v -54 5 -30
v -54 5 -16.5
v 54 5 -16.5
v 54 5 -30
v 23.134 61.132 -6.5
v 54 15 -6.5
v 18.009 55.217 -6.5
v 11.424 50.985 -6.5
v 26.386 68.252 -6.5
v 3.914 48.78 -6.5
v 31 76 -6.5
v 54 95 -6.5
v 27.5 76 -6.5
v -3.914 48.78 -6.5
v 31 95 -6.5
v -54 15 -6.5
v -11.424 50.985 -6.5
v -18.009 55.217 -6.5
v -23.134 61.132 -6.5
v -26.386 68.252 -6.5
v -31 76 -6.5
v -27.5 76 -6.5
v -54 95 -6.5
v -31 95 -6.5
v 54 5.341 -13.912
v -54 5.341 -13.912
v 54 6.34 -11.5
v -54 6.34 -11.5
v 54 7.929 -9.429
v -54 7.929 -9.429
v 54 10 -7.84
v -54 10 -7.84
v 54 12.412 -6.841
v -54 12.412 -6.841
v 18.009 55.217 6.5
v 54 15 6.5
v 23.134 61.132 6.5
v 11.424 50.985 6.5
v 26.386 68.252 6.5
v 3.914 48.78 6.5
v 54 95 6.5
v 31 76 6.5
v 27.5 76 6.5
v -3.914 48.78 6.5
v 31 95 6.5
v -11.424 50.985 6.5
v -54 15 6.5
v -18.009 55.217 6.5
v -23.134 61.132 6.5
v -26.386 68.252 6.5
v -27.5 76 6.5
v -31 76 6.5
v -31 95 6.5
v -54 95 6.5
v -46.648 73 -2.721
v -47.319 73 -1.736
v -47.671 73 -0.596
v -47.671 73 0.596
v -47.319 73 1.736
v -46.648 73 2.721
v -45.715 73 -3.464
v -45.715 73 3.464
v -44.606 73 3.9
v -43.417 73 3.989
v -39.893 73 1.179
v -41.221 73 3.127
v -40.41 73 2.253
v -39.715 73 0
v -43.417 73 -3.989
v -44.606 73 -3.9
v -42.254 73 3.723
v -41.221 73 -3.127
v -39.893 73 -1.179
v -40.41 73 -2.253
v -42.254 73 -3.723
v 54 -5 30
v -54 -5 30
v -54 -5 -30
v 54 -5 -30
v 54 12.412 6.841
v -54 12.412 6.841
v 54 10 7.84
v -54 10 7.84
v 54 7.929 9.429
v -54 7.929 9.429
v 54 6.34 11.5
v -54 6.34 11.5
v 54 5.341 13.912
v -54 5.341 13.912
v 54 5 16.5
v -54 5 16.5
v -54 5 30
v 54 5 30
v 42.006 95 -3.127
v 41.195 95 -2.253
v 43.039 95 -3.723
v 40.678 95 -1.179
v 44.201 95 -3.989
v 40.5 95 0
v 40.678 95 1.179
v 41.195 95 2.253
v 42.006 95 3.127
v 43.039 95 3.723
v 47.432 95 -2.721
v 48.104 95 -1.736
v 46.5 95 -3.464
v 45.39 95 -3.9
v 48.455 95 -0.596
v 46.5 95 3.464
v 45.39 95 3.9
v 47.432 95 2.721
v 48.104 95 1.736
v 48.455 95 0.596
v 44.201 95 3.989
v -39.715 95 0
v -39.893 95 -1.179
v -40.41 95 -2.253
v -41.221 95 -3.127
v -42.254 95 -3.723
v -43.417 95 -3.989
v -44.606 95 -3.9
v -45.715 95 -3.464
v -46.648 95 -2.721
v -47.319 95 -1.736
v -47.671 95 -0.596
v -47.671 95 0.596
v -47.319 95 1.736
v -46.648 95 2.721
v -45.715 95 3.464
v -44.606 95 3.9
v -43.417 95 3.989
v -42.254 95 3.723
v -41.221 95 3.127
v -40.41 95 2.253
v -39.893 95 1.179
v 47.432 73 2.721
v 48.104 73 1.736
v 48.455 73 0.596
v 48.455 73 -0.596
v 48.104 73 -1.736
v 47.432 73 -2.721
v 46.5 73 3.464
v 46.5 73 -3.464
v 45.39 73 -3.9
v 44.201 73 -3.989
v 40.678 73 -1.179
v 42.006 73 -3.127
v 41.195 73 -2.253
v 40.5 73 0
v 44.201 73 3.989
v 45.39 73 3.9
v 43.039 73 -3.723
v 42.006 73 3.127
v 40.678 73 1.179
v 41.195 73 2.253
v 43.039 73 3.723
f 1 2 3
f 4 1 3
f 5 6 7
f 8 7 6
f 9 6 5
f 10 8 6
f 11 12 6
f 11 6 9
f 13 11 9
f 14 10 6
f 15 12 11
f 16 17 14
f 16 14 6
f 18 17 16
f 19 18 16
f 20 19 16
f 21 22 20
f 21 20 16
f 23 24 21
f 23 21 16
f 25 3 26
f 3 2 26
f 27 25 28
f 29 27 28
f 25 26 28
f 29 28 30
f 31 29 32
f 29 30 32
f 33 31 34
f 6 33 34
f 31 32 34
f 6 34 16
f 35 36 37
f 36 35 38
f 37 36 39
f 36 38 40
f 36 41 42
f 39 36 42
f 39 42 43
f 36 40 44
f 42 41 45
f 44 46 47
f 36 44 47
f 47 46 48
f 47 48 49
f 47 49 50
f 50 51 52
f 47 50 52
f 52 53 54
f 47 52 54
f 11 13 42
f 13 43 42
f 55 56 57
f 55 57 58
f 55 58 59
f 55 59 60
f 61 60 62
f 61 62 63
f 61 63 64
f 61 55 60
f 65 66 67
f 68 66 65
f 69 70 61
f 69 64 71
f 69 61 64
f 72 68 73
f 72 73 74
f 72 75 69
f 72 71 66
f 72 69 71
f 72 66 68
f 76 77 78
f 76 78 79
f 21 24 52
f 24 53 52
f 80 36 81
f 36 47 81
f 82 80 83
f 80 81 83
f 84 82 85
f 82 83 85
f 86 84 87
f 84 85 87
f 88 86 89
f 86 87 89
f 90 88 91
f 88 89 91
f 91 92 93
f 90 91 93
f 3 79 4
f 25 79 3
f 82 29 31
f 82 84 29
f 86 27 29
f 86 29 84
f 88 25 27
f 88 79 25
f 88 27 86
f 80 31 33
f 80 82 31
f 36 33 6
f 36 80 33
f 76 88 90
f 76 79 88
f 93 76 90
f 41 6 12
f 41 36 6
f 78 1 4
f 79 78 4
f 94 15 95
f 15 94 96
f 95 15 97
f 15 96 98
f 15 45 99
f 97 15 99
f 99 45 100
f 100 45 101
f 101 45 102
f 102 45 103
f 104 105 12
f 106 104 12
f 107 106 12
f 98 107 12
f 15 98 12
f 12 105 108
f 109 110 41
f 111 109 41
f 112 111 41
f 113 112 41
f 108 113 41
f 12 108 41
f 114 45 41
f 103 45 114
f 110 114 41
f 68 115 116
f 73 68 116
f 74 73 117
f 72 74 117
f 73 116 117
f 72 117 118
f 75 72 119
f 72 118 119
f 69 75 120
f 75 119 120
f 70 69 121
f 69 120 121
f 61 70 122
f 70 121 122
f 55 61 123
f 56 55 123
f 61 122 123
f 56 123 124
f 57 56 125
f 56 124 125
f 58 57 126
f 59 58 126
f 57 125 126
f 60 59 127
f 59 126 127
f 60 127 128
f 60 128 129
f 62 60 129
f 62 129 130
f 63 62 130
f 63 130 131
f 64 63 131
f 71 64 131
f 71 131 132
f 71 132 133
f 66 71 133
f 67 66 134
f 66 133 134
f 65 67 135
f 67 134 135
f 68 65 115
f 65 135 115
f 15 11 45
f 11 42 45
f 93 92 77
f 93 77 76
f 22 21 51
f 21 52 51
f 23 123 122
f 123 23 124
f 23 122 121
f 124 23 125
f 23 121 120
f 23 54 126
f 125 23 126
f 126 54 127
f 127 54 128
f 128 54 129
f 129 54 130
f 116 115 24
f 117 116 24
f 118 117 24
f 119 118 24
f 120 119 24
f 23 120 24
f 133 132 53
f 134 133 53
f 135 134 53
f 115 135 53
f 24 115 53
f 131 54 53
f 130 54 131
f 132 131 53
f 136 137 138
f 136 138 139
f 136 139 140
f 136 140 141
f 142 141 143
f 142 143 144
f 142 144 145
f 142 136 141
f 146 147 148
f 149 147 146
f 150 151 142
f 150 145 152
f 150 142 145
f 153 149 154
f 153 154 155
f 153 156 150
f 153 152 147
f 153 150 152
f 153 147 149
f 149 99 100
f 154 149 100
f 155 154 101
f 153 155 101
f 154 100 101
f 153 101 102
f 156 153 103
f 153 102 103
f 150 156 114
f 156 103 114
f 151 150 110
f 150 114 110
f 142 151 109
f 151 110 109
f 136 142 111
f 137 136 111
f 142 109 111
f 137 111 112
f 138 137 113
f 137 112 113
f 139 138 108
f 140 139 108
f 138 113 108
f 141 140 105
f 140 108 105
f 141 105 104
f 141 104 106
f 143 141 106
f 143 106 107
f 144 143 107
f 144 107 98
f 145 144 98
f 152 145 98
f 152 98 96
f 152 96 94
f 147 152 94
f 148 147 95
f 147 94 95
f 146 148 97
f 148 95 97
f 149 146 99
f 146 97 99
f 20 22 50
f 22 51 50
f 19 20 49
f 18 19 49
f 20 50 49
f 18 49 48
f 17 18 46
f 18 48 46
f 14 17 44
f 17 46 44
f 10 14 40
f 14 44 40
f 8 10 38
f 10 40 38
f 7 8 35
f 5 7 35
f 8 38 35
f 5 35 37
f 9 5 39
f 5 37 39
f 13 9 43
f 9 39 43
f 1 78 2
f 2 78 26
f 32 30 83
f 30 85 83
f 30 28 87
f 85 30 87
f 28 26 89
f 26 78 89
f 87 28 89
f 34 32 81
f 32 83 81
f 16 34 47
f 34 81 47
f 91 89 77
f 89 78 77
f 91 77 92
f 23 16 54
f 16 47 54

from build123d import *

# Parameters (mm, degrees)
SKETCH1_W           = 108
SKETCH1_H           = 10
BOSS_EXTRUDE1_DEPTH = 30
BOSS_EXTRUDE2_DEPTH = 6.5
SKETCH3_R           = 4
CUT_EXTRUDE1_DEPTH  = 22
FILLET1_R           = 10


with BuildPart() as part:
    # Sketch1 → Boss-Extrude1 (new, symmetric)
    with BuildSketch(Plane.XY):
        Rectangle(SKETCH1_W, SKETCH1_H)
    extrude(amount=BOSS_EXTRUDE1_DEPTH, both=True)

    # Sketch2 → Boss-Extrude2 (add, symmetric)
    with BuildSketch(Plane.XY):
        with BuildLine():
            Line((-54, 5), (-54, 95))
            Line((-54, 95), (-31, 95))
            Line((-31, 95), (-31, 76))
            Line((-31, 76), (-27.5, 76))
            ThreePointArc((-27.5, 76), (0, 48.5), (27.5, 76))
            Line((27.5, 76), (31, 76))
            Line((31, 76), (31, 95))
            Line((31, 95), (54, 95))
            Line((54, 95), (54, 5))
            Line((54, 5), (-54, 5))
        make_face()
    extrude(amount=BOSS_EXTRUDE2_DEPTH, both=True)

    # Sketch3 → Cut-Extrude1 (cut)
    with BuildSketch(Plane(origin=(0, 95, 0), x_dir=(1, 0, 0), z_dir=(0, 1, 0))):
        with Locations(Location((44.5, 0, 0), (0, 0, 180))):
            Circle(SKETCH3_R)
        with Locations((-43.715454096, 0)):
            Circle(SKETCH3_R)
    extrude(amount=-CUT_EXTRUDE1_DEPTH, mode=Mode.SUBTRACT)

    # Fillet1
    fillet1_edges = [part.edges().sort_by_distance(p)[0] for p in [
        (0, 5, -6.5),
        (0, 5, 6.5),
    ]]
    fillet(fillet1_edges, radius=FILLET1_R)


solid = part.part
